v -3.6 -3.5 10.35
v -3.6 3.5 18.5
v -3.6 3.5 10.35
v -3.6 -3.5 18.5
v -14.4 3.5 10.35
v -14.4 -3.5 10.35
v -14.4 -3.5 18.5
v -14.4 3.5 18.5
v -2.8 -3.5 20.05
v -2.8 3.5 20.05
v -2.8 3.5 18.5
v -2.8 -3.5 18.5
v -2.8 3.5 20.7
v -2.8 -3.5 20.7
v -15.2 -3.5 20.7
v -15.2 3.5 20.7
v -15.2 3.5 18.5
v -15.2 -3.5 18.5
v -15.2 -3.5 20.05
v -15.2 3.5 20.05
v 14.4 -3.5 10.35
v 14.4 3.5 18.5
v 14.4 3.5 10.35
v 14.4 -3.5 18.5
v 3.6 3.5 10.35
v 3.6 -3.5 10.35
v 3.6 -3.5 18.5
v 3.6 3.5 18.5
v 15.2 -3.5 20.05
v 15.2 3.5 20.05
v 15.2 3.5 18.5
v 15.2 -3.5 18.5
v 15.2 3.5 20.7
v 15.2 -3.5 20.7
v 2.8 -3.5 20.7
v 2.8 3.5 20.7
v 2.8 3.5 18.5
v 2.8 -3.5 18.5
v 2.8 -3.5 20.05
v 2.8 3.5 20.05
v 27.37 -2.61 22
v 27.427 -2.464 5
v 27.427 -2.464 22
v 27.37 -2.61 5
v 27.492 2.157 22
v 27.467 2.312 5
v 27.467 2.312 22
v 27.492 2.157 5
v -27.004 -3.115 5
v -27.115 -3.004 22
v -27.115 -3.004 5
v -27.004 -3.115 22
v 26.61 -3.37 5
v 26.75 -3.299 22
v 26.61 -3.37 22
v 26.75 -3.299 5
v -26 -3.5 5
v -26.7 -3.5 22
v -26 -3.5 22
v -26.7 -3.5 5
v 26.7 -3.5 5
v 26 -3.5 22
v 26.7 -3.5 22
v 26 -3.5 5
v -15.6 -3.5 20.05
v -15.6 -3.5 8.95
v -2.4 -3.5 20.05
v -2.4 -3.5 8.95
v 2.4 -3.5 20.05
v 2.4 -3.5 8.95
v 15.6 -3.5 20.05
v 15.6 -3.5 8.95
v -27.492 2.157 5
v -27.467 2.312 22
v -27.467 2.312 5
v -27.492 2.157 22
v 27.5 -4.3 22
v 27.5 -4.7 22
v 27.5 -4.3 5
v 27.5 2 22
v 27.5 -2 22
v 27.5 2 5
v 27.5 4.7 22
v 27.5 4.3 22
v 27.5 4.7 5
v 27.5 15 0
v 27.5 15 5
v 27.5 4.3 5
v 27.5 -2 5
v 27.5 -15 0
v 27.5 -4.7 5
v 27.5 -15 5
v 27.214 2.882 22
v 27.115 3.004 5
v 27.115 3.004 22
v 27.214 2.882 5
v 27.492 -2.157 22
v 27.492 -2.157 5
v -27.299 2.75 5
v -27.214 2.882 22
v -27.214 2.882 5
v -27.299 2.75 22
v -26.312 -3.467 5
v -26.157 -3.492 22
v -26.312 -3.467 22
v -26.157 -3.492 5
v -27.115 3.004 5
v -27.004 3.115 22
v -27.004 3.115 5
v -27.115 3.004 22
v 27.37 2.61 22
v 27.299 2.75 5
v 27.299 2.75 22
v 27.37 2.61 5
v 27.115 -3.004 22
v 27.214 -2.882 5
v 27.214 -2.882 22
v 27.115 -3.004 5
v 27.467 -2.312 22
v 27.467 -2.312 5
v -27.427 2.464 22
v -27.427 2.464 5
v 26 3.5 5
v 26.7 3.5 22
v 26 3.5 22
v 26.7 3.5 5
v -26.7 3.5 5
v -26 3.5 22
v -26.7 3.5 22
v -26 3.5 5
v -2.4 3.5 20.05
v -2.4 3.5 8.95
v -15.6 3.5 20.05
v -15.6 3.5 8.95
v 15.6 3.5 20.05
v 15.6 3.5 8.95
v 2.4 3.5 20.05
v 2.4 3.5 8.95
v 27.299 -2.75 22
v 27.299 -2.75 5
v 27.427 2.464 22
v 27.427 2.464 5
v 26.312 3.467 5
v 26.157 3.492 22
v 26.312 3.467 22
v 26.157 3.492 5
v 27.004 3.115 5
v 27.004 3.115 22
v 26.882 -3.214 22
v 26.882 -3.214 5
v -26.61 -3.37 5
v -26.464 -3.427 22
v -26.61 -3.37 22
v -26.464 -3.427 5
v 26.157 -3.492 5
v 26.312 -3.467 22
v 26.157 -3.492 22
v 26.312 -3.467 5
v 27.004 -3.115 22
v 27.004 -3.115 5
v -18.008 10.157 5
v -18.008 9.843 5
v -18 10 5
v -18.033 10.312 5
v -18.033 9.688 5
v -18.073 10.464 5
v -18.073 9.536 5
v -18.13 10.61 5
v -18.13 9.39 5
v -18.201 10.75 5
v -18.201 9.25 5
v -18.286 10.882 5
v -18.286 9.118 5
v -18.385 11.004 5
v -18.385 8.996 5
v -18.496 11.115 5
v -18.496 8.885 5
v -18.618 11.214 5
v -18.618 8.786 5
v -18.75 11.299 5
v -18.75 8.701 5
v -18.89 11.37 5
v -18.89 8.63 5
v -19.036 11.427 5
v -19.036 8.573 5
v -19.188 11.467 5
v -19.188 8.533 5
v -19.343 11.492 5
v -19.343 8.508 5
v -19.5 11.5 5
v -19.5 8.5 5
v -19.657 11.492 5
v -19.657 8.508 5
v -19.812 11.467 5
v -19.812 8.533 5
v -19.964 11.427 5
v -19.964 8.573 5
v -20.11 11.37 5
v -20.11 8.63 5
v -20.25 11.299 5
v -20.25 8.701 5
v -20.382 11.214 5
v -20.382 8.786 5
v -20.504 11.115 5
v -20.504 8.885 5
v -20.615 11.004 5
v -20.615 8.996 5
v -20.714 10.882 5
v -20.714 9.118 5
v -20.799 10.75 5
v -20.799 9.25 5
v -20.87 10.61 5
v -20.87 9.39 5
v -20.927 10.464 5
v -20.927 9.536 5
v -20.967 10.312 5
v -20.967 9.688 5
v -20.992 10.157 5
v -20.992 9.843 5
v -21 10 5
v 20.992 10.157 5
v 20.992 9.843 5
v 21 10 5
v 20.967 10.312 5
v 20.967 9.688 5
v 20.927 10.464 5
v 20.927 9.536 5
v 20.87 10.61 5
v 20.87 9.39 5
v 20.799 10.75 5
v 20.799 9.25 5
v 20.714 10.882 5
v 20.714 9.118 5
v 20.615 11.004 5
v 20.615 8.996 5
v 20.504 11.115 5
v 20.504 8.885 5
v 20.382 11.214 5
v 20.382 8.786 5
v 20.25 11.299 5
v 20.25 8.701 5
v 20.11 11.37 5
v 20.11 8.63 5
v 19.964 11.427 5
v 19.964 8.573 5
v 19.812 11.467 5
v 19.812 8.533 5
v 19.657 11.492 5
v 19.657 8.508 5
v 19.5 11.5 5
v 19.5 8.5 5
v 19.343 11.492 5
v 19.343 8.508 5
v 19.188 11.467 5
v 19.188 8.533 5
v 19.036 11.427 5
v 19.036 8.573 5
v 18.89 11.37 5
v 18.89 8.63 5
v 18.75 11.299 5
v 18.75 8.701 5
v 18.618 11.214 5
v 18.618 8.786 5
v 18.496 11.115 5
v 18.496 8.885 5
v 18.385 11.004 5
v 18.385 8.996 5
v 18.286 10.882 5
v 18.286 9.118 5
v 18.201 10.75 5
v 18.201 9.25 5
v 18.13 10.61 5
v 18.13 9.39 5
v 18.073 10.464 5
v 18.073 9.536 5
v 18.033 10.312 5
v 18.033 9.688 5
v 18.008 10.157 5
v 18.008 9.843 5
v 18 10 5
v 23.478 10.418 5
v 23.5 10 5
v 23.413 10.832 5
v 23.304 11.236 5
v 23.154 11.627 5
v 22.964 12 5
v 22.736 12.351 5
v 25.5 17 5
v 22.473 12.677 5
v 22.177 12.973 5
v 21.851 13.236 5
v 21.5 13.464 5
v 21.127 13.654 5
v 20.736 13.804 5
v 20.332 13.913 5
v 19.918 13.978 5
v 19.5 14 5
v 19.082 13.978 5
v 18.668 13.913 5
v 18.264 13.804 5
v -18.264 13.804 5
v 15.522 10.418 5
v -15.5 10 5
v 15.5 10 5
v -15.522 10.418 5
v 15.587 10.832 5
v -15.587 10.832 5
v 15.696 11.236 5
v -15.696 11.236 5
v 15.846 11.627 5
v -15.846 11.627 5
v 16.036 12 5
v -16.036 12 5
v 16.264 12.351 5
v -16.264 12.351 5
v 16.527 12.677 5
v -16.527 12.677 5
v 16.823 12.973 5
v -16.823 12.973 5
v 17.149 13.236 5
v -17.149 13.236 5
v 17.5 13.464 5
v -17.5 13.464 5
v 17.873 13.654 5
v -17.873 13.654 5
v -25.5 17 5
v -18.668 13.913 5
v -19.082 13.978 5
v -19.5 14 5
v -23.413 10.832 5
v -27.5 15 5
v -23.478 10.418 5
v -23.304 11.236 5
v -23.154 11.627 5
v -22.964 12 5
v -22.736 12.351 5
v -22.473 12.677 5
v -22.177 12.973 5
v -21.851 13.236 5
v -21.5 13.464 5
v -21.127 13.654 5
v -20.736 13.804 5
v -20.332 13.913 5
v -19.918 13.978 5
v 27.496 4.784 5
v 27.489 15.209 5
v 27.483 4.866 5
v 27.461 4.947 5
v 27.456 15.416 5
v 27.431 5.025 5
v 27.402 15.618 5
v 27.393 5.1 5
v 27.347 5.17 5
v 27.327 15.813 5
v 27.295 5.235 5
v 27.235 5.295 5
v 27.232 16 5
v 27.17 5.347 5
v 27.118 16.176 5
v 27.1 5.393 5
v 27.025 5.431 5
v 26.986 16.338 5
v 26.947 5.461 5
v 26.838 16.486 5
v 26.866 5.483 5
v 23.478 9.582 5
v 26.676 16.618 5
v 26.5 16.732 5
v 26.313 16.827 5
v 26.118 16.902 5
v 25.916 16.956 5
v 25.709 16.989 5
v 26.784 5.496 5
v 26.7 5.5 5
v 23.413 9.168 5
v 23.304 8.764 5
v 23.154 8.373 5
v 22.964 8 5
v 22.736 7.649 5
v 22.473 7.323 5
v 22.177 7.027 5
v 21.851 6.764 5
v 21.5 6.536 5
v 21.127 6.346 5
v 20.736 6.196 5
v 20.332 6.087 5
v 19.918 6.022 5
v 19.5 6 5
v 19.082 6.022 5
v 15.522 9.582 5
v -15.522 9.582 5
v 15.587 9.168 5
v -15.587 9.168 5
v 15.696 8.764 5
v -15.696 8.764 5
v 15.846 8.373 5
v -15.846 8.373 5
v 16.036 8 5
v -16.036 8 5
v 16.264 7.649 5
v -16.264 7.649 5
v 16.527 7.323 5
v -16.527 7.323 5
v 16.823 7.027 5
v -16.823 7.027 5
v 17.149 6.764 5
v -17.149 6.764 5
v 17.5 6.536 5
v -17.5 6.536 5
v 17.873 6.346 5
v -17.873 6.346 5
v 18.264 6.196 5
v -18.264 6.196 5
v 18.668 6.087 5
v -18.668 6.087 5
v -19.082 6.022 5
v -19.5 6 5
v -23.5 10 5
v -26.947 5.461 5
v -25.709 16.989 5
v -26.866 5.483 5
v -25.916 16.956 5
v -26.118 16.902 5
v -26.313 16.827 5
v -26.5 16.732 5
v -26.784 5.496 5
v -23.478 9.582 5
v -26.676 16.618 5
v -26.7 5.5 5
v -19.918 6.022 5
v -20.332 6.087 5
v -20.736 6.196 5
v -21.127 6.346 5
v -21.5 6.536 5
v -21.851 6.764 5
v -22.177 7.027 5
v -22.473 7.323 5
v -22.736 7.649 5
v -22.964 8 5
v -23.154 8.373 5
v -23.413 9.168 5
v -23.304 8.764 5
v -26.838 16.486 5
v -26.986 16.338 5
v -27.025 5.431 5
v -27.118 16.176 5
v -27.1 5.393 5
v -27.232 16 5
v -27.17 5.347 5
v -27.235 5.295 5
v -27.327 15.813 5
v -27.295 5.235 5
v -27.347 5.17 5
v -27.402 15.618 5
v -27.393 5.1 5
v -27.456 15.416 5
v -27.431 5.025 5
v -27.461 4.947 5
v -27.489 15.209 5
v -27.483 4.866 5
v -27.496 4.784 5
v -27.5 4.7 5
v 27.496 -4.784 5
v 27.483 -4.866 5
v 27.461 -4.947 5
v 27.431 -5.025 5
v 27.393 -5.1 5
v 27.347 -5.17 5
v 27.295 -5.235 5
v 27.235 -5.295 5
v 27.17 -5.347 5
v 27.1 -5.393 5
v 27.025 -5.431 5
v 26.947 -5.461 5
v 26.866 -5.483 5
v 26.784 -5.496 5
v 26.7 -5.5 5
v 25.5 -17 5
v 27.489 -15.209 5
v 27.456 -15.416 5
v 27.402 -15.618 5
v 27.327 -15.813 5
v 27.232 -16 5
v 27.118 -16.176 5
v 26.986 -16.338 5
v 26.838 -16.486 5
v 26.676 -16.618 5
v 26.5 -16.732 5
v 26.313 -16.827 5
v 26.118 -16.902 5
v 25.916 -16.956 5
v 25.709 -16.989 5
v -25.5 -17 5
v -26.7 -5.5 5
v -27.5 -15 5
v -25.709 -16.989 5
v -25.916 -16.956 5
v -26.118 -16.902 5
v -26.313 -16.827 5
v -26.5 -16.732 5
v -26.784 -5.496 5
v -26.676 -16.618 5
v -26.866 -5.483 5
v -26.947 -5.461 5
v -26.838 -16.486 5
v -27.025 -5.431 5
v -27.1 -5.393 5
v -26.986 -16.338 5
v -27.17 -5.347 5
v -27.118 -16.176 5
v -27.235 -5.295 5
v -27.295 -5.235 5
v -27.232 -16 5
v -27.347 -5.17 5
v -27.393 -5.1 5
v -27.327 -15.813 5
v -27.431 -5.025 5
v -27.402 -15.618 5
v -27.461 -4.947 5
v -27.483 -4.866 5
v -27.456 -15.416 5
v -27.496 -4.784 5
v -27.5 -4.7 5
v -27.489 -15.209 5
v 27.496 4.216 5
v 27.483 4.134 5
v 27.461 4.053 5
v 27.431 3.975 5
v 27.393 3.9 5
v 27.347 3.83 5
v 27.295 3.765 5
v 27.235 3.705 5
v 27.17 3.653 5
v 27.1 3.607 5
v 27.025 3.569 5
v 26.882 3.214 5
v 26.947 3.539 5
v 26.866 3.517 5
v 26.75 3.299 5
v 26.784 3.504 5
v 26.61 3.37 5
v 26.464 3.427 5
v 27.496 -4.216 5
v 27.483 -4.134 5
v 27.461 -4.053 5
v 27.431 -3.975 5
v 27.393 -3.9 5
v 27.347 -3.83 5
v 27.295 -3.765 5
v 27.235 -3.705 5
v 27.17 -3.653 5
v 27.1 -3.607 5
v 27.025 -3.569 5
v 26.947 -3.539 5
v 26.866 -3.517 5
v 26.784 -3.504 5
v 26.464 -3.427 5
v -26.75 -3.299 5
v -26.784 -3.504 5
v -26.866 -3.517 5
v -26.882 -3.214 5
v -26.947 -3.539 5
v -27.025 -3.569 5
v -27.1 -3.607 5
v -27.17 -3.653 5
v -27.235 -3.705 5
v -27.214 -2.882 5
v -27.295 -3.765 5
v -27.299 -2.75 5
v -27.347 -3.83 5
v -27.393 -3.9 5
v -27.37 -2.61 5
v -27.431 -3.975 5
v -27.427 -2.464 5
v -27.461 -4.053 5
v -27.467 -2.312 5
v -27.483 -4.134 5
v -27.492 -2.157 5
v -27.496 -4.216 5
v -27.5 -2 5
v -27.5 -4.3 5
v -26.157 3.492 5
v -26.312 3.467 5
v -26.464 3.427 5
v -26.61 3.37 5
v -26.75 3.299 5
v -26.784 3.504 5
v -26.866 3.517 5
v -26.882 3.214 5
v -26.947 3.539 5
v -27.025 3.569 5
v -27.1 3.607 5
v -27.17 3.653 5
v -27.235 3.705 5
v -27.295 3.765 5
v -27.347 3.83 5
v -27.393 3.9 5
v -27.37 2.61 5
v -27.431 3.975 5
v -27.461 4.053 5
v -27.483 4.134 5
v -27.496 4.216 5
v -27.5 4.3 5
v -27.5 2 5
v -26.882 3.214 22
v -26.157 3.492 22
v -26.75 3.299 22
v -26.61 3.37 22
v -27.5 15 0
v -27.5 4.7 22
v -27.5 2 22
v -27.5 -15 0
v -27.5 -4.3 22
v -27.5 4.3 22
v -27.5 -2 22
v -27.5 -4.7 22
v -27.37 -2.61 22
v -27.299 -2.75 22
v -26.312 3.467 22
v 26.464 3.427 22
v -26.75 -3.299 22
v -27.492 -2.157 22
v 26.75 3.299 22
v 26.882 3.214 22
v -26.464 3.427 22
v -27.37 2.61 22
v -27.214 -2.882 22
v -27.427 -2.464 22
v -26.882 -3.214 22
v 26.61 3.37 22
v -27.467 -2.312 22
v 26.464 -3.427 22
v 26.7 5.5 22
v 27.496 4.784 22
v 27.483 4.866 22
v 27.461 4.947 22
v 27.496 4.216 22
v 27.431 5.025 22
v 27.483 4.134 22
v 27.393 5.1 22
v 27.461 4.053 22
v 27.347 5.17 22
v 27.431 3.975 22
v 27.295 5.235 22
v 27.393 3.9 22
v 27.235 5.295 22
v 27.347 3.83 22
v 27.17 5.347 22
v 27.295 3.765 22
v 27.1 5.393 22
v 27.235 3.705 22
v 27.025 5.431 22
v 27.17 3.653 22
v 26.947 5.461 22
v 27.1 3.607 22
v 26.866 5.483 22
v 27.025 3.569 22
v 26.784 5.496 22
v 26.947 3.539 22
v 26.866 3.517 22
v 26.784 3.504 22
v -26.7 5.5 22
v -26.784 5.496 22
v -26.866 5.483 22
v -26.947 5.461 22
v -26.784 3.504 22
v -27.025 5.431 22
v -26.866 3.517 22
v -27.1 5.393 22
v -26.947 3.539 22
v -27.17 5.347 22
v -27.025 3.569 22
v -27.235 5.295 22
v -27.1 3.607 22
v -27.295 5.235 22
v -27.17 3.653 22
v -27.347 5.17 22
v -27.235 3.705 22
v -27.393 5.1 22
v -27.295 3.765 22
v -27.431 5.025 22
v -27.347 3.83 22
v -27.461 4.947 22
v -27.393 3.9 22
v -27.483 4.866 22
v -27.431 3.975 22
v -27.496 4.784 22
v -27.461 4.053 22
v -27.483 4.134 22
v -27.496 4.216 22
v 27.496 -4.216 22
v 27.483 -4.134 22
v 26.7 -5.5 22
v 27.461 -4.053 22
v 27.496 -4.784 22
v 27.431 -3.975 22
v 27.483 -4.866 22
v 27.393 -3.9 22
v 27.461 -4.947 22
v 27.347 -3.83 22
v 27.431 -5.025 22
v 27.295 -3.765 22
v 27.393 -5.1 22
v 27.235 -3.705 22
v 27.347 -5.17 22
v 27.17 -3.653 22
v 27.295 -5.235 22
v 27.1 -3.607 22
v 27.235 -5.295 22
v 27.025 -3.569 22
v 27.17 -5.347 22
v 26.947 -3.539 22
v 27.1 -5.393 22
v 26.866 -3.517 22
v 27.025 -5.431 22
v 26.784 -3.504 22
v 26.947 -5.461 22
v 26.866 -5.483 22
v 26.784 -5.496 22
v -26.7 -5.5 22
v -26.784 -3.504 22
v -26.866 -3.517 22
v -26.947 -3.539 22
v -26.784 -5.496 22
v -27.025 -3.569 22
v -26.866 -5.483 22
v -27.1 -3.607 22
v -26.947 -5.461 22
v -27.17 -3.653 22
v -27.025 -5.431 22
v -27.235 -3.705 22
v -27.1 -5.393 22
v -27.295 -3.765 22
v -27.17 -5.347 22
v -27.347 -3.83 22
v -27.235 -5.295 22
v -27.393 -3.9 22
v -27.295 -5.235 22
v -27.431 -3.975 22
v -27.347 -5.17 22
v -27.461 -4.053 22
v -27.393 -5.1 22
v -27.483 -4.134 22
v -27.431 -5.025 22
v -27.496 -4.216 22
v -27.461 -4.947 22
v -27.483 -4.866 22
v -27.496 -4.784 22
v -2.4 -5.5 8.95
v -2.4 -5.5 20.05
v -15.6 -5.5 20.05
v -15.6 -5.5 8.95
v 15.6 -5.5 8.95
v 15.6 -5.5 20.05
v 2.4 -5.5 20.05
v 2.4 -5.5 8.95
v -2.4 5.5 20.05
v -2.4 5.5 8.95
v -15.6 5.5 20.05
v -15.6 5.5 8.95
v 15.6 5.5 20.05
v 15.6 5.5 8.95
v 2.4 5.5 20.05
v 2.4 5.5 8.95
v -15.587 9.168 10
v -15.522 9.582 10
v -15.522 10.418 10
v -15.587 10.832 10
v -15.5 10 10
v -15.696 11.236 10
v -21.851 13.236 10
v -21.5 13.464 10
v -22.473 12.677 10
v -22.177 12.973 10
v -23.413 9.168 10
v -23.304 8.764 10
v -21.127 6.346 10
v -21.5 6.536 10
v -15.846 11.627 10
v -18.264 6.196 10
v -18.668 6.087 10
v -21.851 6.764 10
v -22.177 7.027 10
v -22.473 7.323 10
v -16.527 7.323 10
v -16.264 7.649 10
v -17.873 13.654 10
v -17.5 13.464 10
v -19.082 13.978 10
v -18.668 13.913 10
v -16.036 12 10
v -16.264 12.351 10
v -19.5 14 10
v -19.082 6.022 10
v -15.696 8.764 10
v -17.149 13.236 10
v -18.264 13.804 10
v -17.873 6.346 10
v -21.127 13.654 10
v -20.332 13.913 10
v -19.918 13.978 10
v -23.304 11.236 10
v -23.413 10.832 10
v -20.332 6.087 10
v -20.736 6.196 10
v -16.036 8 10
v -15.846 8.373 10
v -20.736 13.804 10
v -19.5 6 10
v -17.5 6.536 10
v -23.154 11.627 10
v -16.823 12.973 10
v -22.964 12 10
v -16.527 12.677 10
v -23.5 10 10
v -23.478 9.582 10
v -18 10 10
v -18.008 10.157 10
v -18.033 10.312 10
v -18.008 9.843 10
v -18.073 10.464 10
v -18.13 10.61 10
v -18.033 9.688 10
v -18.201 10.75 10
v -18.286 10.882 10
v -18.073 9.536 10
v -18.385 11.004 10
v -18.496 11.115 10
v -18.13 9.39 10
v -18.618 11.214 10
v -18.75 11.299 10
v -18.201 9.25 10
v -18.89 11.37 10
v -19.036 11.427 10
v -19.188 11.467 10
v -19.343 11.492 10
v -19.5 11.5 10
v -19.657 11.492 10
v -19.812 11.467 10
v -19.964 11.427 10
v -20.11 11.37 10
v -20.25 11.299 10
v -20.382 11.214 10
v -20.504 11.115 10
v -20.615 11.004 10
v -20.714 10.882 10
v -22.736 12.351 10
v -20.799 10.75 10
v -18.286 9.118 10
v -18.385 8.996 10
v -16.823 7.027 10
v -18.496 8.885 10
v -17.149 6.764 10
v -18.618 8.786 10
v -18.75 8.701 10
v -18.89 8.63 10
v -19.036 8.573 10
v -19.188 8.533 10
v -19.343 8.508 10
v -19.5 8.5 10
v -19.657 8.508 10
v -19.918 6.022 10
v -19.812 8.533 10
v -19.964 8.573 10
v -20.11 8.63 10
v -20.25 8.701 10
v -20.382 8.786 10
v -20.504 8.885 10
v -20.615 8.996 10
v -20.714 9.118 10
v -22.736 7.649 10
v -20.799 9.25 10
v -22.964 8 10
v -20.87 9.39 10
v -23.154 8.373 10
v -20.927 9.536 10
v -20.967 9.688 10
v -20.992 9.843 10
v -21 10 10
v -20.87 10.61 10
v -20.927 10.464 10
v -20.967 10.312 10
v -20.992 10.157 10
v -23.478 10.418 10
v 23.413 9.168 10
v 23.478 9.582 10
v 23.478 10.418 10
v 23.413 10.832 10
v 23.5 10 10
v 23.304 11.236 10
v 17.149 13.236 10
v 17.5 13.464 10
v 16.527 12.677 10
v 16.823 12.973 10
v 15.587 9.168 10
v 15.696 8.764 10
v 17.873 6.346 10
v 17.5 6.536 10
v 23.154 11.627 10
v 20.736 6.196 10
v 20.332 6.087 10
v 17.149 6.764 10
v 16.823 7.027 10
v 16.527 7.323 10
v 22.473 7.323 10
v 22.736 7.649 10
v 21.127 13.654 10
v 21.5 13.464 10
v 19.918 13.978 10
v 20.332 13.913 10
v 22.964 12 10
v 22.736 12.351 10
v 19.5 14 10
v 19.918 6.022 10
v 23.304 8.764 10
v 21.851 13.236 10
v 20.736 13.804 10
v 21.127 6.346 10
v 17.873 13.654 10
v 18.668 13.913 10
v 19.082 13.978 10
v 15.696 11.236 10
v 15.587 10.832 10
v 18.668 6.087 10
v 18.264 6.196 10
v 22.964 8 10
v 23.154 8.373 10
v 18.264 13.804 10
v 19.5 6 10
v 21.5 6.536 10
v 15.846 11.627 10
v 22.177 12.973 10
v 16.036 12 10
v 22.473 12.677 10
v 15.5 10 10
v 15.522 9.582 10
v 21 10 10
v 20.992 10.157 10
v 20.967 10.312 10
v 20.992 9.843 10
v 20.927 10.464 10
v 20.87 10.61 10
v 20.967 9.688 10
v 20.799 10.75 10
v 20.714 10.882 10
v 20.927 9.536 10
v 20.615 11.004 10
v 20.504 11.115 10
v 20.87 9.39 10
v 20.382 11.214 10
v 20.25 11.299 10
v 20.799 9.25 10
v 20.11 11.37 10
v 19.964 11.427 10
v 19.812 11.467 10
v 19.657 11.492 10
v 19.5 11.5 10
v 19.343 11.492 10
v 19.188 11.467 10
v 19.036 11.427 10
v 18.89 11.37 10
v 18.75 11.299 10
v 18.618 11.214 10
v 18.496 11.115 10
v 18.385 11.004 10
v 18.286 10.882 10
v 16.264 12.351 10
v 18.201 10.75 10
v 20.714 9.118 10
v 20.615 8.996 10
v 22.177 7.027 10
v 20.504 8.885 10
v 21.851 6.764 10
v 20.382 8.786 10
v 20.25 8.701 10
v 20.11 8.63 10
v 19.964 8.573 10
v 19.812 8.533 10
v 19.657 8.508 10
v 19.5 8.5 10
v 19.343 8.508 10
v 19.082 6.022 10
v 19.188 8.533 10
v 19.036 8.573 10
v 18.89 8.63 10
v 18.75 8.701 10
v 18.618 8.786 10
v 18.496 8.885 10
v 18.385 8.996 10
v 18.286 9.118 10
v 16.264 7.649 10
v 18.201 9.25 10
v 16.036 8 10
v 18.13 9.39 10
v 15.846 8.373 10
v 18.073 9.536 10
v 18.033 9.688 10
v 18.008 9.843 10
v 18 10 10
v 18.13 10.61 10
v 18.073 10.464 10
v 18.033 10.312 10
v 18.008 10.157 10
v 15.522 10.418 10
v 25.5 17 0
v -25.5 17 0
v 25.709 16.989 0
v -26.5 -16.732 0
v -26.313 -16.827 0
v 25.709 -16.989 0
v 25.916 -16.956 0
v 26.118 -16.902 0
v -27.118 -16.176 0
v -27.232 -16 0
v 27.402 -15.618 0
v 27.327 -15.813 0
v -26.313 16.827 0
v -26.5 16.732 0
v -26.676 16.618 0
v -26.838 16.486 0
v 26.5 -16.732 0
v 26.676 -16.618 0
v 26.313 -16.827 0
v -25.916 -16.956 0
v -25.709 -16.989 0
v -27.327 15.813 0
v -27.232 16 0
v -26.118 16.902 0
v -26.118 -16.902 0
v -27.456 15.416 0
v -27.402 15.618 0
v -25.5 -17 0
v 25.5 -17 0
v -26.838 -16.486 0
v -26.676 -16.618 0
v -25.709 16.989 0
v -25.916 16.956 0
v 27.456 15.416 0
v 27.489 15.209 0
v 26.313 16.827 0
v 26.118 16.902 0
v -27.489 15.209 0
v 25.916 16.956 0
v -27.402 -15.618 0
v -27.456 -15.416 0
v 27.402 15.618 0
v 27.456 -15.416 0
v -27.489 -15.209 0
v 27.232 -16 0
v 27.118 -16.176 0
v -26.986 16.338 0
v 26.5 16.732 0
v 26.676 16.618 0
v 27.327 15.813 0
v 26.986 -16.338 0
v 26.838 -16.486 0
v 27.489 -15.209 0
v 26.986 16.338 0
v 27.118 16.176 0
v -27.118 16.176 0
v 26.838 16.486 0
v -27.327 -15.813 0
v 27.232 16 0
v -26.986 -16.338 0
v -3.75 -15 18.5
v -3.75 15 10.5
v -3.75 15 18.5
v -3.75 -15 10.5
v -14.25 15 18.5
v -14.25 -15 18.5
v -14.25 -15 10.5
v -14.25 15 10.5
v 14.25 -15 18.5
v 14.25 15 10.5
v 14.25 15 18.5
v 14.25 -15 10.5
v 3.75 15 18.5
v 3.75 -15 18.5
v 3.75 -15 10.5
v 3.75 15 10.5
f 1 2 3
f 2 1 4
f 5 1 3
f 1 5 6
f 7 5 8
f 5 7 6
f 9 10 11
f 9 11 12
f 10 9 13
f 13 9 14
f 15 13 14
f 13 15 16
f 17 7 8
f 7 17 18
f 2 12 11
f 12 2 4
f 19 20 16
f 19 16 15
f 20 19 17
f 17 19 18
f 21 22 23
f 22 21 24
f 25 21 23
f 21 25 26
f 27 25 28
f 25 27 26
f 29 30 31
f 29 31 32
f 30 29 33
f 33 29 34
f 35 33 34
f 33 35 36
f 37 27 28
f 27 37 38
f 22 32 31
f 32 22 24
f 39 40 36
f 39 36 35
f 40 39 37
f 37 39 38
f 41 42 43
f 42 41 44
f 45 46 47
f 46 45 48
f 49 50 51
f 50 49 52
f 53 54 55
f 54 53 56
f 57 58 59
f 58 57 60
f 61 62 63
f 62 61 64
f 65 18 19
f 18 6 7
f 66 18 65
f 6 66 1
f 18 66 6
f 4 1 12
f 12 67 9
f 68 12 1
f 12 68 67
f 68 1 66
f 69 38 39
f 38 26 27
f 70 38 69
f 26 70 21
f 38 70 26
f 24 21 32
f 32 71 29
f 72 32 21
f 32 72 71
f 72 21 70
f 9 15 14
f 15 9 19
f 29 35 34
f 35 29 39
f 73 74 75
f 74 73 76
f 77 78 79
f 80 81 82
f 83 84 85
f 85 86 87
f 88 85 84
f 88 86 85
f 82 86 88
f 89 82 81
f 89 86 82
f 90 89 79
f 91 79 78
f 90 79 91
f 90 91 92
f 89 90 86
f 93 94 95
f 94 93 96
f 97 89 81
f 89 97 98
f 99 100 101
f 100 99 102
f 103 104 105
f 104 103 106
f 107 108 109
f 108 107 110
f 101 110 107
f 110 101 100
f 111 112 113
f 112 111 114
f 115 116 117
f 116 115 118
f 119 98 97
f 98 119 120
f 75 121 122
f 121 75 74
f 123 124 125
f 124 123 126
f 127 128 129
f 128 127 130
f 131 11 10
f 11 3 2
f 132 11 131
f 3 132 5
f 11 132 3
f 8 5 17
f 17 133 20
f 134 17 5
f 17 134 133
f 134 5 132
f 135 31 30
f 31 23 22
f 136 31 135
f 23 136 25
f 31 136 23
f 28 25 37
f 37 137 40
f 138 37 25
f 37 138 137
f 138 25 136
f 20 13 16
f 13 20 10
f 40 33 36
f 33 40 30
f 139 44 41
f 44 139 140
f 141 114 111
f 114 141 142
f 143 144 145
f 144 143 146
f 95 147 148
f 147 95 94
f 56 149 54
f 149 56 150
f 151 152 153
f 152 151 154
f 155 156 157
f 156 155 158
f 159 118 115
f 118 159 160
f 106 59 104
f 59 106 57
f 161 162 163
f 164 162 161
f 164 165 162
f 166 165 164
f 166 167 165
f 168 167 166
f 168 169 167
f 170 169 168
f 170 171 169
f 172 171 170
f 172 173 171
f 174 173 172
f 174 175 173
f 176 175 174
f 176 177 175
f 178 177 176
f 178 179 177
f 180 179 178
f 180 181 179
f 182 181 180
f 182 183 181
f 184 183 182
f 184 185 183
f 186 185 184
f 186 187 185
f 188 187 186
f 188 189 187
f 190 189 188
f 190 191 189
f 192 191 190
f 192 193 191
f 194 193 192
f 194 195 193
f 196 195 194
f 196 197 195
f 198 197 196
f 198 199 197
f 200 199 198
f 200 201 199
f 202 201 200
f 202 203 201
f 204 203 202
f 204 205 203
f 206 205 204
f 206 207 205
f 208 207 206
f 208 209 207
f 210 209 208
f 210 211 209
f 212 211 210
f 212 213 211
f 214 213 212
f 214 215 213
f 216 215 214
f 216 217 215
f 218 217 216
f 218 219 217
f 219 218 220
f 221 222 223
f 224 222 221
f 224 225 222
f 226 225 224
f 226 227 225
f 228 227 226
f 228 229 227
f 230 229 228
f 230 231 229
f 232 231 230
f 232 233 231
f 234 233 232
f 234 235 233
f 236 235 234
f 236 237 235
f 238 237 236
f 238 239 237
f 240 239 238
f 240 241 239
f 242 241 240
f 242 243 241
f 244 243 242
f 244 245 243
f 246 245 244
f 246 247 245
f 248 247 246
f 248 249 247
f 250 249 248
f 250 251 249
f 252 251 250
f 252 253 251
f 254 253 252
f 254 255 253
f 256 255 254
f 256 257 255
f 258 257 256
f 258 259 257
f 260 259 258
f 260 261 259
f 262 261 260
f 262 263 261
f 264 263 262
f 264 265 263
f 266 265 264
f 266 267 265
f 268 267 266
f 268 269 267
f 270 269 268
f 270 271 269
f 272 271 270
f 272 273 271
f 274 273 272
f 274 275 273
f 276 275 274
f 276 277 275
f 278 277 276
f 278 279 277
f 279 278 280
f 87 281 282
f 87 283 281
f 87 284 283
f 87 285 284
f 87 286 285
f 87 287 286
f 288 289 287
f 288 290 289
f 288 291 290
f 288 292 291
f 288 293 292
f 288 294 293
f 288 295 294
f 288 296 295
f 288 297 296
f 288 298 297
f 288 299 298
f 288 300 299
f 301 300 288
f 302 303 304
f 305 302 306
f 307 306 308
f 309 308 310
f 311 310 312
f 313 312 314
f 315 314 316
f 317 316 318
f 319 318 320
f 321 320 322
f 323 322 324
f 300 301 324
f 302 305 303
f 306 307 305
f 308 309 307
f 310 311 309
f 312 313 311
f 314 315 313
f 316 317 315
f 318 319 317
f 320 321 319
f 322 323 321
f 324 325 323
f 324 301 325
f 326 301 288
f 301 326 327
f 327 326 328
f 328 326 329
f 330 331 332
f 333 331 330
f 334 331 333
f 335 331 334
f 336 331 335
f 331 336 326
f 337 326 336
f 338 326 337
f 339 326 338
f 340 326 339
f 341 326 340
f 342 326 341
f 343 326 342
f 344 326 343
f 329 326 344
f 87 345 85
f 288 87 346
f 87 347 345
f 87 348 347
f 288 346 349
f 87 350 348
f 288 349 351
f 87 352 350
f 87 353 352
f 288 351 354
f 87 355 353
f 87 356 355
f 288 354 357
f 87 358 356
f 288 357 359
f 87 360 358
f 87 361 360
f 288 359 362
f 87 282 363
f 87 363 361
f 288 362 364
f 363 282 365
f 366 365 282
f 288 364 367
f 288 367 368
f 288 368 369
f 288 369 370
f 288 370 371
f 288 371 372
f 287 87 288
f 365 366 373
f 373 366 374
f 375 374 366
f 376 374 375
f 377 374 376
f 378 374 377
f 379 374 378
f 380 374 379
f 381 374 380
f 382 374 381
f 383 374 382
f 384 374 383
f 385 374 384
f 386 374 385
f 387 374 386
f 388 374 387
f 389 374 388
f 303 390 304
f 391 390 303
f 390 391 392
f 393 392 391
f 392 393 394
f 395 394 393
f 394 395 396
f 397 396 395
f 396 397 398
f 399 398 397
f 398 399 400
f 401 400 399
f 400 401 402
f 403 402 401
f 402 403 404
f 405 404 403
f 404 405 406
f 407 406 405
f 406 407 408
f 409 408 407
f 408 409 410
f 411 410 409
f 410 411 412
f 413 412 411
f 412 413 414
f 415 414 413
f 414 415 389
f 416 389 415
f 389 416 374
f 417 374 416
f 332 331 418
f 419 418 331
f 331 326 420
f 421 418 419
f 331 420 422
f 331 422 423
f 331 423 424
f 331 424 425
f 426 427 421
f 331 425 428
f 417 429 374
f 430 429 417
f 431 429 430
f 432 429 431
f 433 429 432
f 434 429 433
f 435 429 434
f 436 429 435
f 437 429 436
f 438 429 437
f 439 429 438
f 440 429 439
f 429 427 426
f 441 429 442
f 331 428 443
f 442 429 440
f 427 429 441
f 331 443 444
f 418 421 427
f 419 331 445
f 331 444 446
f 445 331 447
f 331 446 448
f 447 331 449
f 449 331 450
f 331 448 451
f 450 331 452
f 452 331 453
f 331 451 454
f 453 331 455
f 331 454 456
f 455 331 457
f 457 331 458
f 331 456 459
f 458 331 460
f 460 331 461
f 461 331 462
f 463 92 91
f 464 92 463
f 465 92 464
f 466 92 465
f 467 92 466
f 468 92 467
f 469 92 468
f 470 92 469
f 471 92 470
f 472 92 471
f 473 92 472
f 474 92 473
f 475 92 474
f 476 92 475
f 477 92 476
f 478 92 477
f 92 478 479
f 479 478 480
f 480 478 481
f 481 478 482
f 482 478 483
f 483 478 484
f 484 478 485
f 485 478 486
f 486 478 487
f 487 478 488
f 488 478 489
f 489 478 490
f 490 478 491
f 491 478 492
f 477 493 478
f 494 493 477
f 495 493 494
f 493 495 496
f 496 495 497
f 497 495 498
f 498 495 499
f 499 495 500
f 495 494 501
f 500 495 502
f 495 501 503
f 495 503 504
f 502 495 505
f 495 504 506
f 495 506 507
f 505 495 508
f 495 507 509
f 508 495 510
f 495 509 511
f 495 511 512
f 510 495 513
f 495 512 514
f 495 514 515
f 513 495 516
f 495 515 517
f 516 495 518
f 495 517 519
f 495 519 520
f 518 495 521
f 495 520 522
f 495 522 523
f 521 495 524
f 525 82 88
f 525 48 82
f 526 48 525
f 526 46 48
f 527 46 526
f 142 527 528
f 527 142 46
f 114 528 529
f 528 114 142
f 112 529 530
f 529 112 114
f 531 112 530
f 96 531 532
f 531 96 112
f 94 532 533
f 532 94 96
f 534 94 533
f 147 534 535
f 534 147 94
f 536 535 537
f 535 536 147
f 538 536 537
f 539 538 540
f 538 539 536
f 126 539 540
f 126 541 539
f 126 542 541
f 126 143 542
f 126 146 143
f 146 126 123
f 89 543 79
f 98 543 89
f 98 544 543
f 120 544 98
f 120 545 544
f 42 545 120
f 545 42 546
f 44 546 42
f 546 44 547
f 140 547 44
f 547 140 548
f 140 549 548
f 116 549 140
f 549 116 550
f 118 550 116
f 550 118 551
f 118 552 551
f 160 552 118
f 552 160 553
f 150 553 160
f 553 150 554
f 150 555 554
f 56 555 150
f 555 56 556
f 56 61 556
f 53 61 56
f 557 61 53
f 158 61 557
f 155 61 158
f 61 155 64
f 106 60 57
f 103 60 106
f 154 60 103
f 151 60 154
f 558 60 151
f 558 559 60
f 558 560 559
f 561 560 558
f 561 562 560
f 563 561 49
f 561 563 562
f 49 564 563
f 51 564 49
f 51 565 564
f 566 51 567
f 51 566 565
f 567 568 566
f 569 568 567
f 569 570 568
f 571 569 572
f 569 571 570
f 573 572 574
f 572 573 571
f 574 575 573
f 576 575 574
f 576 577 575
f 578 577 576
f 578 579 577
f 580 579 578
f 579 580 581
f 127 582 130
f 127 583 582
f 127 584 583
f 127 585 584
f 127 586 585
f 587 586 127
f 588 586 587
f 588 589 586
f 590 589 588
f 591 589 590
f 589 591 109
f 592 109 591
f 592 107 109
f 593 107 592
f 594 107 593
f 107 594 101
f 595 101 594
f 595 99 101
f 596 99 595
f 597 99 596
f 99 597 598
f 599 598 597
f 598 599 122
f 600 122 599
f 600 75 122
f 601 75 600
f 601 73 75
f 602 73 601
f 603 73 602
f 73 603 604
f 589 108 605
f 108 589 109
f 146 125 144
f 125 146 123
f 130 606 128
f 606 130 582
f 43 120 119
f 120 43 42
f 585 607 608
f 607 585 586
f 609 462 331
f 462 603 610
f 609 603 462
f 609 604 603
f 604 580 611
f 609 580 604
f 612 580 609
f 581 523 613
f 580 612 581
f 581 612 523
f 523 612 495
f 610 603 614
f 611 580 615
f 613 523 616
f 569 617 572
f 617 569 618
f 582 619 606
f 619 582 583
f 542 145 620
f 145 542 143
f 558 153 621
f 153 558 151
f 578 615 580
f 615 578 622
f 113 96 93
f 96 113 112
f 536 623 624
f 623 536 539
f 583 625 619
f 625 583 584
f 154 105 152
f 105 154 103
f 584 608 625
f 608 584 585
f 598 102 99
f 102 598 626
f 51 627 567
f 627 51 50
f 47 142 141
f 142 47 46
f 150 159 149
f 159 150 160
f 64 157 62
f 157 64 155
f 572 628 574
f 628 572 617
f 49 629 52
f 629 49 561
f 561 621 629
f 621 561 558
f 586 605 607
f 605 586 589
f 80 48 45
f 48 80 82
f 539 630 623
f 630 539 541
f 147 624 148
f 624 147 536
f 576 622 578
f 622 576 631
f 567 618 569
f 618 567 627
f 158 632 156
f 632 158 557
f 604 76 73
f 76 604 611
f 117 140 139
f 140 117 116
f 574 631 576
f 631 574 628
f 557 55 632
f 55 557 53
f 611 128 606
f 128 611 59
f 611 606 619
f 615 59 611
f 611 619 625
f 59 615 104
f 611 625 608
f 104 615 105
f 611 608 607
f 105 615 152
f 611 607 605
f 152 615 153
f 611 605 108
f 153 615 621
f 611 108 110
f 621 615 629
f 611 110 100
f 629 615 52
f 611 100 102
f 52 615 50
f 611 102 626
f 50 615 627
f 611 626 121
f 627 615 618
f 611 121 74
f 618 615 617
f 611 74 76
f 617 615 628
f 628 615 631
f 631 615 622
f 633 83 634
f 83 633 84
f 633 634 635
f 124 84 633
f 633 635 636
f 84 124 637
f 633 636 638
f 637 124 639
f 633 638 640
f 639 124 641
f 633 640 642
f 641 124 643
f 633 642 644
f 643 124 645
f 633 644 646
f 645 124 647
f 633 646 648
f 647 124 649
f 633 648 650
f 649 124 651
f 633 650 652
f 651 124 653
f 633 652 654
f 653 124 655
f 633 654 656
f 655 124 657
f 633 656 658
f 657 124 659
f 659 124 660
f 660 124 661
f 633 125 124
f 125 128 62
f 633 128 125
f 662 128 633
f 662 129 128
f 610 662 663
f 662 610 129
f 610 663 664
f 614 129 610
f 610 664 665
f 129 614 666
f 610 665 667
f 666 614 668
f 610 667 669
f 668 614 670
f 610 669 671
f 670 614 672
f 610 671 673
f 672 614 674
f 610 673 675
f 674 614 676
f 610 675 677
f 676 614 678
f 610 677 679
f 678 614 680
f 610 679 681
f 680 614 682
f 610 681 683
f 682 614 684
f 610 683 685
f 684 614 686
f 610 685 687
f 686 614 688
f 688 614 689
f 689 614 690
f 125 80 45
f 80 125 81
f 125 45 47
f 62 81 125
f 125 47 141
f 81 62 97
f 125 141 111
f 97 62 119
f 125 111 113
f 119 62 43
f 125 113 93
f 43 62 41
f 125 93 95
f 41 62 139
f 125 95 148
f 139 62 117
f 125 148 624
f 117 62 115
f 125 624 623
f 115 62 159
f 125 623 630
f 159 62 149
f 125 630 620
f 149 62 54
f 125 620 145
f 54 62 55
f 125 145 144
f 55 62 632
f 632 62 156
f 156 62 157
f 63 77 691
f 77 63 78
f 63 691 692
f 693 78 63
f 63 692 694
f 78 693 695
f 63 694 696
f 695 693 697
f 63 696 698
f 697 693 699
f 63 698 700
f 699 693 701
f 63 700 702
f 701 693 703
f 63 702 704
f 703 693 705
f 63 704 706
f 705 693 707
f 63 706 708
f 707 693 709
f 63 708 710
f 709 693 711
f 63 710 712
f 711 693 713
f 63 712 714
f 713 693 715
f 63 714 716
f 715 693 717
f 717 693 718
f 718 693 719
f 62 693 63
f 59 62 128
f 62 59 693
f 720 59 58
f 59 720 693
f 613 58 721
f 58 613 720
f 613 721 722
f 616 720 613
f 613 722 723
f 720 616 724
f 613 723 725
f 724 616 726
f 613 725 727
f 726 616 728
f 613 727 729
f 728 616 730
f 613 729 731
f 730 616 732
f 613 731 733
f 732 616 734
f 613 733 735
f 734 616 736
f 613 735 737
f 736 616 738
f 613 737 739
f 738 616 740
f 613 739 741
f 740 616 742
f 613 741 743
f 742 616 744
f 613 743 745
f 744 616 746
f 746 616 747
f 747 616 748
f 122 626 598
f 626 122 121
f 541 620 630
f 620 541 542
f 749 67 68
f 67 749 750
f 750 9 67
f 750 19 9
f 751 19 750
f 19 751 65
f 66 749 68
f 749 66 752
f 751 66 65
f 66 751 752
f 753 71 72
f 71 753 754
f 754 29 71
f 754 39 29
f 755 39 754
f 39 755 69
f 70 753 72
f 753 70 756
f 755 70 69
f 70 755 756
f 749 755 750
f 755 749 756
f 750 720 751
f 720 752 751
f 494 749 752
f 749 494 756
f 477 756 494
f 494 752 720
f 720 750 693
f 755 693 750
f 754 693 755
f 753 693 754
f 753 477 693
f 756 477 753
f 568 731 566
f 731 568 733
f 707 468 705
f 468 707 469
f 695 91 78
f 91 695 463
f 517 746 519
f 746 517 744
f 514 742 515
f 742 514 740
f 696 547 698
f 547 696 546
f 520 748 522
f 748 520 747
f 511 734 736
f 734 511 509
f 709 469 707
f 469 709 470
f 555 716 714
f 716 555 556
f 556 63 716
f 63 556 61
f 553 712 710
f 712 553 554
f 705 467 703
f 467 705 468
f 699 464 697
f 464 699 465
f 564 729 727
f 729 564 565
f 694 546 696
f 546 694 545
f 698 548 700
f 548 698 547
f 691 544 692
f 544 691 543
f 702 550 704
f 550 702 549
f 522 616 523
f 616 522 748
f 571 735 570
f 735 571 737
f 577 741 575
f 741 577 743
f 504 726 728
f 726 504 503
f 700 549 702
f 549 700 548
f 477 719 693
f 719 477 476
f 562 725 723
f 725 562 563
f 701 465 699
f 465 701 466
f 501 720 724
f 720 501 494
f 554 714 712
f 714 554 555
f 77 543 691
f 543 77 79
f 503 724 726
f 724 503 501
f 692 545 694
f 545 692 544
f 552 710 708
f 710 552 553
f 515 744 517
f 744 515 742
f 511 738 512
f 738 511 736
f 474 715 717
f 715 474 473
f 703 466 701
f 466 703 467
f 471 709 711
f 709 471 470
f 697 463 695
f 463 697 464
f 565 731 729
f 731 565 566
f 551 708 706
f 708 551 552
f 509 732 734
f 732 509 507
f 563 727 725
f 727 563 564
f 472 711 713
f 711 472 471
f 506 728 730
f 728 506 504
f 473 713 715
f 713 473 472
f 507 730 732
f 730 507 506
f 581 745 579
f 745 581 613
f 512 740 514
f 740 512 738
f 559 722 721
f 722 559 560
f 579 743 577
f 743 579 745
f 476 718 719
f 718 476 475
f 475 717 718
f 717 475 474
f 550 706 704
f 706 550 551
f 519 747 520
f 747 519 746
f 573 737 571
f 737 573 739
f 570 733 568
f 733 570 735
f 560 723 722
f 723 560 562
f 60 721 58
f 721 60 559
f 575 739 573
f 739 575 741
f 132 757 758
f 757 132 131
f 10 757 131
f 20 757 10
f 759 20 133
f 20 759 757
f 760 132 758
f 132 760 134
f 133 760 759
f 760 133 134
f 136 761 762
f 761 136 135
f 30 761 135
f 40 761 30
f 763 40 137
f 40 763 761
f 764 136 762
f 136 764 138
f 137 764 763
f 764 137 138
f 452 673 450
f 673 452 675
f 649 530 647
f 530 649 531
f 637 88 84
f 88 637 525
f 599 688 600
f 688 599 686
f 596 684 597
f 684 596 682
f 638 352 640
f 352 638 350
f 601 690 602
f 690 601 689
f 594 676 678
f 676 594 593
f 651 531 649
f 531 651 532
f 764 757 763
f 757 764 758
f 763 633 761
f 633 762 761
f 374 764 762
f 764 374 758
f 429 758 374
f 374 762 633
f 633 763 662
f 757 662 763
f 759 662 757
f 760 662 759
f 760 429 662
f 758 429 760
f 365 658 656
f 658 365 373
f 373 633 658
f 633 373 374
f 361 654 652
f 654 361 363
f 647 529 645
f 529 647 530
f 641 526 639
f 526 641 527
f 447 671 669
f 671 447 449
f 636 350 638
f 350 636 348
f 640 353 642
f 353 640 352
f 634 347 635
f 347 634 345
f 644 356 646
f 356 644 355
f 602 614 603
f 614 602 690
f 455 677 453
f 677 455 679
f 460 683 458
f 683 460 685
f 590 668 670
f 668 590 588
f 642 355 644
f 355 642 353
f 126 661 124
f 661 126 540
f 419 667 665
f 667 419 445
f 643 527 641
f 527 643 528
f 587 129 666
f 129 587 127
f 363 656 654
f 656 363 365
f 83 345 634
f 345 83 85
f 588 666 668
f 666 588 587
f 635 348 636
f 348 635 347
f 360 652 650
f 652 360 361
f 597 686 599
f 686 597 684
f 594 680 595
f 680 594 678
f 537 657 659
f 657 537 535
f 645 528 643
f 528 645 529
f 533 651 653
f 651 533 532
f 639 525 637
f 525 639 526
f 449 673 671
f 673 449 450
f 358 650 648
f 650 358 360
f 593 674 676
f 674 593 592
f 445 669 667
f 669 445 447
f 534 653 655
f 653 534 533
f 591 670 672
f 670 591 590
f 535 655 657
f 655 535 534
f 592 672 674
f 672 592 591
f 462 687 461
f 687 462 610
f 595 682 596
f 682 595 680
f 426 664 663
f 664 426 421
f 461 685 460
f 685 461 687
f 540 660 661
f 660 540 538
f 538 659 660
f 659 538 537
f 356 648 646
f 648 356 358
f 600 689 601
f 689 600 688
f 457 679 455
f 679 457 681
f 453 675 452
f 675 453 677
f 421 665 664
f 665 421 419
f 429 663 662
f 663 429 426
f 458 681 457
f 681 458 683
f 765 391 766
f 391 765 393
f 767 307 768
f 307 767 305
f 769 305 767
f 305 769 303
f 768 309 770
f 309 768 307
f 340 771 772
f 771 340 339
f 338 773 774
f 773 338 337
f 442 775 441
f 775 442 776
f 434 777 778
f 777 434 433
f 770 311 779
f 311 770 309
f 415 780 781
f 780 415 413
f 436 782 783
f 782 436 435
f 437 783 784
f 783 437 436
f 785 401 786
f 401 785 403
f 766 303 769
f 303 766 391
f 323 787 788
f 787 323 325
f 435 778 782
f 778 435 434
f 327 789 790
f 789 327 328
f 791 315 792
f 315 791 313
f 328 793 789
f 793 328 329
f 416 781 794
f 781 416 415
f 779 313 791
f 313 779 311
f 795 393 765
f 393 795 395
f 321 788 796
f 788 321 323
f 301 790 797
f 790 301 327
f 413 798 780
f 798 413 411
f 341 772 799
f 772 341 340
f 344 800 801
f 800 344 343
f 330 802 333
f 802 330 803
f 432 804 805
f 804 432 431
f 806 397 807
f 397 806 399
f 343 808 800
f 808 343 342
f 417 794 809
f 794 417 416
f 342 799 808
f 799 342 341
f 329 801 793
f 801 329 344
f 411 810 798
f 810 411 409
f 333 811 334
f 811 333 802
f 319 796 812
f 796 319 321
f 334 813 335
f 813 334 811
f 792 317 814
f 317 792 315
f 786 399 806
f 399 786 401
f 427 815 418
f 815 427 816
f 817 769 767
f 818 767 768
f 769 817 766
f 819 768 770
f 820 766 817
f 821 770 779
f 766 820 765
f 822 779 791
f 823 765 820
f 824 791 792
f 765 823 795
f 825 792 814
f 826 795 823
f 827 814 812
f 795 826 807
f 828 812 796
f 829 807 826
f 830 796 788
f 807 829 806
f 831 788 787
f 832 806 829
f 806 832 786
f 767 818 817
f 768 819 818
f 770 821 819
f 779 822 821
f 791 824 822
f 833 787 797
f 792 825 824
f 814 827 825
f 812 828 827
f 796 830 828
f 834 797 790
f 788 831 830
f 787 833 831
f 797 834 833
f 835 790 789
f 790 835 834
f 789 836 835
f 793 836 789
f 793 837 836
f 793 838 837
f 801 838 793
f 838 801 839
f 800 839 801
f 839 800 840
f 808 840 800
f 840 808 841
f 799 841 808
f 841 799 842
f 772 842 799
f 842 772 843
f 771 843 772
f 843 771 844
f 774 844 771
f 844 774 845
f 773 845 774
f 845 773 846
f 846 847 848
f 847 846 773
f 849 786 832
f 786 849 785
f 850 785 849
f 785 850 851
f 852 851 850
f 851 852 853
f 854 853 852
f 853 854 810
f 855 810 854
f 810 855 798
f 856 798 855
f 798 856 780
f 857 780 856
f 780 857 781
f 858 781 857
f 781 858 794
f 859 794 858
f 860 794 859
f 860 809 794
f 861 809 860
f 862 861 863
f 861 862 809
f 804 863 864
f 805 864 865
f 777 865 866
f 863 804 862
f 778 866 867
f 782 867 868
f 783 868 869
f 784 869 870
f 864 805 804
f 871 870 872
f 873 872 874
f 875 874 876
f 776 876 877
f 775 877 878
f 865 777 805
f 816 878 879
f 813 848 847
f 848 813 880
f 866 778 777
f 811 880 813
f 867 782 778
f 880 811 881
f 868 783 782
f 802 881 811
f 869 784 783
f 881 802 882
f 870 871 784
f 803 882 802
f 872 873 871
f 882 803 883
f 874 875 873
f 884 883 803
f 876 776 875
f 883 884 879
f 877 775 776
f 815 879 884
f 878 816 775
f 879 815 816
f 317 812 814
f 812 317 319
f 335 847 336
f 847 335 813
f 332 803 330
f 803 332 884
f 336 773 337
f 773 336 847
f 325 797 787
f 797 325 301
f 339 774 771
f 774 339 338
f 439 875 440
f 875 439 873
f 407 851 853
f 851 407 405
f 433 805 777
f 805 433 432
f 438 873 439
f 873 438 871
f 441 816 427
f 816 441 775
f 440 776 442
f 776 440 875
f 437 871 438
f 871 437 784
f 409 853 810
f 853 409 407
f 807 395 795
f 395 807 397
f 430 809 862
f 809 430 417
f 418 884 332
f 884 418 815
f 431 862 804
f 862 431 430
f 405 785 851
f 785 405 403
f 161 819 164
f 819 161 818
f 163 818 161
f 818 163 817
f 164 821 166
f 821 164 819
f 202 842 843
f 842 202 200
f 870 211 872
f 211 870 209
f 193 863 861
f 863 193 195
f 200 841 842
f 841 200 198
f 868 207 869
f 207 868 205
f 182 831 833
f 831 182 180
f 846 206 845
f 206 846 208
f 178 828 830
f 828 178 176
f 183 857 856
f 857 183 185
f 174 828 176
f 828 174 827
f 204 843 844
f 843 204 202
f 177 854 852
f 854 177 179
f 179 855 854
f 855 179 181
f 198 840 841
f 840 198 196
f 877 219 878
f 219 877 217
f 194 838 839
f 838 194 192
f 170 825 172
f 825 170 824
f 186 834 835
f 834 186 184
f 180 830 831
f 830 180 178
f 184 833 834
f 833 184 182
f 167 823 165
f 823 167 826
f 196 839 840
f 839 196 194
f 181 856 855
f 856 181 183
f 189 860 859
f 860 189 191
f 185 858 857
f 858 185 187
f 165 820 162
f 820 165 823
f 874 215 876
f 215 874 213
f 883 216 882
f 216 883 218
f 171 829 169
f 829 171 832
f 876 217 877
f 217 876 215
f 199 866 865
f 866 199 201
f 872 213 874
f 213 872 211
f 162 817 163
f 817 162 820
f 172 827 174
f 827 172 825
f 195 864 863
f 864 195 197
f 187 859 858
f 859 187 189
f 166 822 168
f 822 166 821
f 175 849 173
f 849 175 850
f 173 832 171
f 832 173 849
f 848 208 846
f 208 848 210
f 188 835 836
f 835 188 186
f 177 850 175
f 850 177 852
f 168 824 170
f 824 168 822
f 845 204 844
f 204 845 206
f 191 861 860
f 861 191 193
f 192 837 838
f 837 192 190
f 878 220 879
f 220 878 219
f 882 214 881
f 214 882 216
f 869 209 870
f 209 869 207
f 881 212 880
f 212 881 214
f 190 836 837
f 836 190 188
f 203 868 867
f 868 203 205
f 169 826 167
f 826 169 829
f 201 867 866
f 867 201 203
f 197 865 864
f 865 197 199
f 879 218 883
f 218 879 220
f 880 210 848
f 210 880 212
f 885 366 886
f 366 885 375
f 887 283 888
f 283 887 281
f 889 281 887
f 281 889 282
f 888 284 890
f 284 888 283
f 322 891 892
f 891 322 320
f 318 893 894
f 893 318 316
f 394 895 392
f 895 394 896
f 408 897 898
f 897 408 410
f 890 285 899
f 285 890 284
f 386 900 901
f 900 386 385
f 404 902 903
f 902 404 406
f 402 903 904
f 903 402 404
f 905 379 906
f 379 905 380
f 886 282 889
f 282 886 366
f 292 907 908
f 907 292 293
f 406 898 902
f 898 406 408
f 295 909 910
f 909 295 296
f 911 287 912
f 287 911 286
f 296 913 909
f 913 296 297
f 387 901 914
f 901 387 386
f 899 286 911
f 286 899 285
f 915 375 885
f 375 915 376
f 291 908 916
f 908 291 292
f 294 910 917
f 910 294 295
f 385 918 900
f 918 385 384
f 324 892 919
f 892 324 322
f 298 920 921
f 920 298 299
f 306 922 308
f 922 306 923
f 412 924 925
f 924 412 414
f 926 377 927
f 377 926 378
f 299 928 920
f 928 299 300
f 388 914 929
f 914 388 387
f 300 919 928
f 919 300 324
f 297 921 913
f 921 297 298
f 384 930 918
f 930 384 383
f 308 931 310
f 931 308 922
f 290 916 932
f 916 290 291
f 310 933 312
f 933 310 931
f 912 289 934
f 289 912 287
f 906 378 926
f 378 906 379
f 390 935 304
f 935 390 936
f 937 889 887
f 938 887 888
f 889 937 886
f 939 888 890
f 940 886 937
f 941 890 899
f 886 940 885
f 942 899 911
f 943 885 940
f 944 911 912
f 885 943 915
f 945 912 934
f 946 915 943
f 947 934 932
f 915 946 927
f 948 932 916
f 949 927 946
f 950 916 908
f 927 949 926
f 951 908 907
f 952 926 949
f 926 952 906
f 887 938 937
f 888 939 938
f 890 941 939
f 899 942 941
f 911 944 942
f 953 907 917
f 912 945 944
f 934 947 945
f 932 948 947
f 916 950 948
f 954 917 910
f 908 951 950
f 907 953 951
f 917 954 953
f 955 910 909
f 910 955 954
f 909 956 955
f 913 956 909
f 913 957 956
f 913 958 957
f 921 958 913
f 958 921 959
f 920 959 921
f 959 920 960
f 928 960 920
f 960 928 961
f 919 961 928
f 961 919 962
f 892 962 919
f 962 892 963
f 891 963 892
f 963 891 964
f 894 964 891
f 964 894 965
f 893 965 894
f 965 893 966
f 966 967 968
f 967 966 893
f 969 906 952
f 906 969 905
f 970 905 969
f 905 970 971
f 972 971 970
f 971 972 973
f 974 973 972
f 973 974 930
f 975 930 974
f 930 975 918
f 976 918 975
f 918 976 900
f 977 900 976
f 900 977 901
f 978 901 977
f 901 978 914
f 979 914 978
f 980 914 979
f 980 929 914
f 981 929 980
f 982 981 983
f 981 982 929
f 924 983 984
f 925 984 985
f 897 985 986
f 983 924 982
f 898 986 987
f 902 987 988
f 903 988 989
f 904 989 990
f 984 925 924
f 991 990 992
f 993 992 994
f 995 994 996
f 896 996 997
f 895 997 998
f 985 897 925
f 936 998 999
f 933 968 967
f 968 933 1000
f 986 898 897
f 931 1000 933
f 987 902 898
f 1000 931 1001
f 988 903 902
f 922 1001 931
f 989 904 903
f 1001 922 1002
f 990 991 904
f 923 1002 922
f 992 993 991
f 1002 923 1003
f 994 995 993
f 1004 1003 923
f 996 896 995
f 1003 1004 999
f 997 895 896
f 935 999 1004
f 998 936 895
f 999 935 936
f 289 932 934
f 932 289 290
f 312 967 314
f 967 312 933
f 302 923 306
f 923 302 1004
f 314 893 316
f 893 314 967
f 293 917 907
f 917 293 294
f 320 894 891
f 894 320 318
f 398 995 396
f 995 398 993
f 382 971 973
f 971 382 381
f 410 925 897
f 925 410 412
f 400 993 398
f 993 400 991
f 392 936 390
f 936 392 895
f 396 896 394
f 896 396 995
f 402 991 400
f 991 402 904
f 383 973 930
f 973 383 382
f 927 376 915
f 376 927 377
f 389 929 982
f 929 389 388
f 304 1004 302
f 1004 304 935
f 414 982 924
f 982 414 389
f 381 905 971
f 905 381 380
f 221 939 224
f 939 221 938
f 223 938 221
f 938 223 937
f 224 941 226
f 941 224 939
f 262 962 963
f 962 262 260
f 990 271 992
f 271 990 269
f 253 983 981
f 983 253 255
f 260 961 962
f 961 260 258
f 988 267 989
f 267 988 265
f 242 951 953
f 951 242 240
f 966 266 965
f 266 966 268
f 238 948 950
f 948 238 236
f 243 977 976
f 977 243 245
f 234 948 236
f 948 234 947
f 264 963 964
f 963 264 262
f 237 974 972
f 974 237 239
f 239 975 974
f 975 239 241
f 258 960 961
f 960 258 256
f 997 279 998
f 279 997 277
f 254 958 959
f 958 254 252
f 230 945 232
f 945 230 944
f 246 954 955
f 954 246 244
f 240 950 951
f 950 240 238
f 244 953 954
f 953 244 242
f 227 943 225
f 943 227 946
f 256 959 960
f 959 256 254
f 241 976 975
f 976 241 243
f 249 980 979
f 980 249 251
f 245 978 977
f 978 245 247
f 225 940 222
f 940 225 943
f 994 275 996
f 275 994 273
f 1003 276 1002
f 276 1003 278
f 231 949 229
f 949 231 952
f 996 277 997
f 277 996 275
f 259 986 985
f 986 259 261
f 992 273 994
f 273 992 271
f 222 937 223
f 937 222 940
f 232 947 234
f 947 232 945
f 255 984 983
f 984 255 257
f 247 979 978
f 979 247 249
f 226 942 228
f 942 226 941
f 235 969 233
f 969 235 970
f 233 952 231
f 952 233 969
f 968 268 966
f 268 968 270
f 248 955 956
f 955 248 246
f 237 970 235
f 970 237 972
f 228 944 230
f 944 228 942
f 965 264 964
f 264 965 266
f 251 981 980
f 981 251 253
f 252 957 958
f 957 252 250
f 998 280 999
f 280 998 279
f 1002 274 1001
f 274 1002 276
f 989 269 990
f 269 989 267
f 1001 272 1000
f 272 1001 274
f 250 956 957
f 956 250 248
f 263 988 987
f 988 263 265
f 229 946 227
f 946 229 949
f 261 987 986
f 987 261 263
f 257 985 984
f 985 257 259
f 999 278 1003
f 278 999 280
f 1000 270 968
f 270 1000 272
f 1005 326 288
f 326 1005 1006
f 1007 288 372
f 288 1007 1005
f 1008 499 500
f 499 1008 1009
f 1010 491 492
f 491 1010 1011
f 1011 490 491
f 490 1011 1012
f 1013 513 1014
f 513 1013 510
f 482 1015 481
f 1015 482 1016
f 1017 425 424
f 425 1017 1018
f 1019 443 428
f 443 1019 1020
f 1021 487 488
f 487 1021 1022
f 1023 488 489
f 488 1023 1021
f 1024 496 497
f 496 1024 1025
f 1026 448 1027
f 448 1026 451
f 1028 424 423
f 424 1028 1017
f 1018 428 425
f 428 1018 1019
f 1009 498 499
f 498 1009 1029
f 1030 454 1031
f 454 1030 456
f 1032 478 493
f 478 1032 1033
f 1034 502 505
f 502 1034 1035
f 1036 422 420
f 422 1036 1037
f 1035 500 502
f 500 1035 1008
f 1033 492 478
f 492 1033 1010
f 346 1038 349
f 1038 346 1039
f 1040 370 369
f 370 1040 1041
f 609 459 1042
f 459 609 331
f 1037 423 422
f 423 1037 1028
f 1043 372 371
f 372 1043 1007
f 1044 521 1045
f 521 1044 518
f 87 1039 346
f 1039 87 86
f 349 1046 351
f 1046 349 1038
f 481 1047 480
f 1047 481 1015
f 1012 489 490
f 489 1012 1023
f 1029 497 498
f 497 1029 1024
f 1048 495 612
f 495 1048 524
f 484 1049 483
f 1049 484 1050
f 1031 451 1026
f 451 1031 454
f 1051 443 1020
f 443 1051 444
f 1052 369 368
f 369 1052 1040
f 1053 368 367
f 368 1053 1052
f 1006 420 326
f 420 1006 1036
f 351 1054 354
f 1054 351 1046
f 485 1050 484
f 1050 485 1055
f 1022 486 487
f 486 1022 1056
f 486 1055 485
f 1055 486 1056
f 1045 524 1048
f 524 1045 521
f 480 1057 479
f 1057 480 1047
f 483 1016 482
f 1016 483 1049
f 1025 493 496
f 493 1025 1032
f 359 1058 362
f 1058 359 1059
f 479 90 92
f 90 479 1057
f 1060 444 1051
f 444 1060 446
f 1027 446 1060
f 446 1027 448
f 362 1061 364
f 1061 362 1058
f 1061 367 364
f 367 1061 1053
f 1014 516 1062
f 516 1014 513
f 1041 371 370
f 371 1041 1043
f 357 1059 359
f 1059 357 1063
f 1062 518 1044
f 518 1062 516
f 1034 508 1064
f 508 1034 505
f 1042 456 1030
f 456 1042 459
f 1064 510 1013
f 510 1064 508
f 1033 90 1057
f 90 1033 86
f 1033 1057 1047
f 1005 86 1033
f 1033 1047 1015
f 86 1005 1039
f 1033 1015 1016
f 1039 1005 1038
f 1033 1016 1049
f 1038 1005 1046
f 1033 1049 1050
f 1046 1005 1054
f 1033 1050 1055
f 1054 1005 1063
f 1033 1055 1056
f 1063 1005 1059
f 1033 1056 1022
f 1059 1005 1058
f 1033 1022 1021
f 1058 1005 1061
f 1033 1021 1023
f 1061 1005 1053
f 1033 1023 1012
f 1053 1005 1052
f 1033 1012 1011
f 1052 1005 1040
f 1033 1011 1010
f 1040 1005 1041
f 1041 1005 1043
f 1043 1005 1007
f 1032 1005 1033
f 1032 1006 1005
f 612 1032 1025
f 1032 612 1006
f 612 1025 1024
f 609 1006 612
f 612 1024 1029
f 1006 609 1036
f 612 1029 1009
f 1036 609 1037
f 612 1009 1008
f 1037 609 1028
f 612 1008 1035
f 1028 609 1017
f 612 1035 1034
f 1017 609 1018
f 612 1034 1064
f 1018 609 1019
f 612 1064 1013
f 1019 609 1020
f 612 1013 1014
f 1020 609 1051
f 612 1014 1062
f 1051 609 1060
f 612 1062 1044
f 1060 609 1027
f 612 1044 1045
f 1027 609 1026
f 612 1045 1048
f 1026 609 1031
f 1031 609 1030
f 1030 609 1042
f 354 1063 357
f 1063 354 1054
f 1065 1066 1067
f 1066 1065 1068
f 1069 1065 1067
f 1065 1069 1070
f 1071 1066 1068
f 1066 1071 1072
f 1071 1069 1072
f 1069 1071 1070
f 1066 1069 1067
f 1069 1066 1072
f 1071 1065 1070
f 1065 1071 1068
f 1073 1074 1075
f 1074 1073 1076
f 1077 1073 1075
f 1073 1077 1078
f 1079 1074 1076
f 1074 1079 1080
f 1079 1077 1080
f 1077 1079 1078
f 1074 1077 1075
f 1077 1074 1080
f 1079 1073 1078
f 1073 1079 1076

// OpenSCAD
/*
Standalone SC Connector Holder Test Piece
- Prints only the internal SC connector holder/rack.
- No enclosure, no cable holes, no lid.
- Two simplex SC coupler openings face front/back through the vertical rack.
- Adjust SC_Cutout_* values if your couplers fit too tight or too loose.
*/

$fn = 60;

/* [SC connector holder test settings] */
SC_Count                 = 2;
SC_Holder_Spacing        = 18;     // center-to-center spacing between SC couplers
SC_Cutout_Width          = 10.5;   // SC coupler body width, side-to-side
SC_Cutout_Height         = 8.0;    // SC coupler body height through bracket
SC_Cutout_Length         = 30.0;   // visual/test clearance length front-to-back
SC_Holder_Base_Height    = 5.0;    // raised base height
SC_Holder_Block_Height   = 17.0;   // vertical bracket height above base
SC_Holder_Block_Thickness= 7.0;    // front/back thickness of retaining bracket
SC_Holder_ScrewDiameter  = 3.0;    // optional base screw holes
SC_Clearance             = 0.30;   // extra clearance added to cutout width/height
Show_Test_Coupler_Ghosts = true;   // translucent reference blocks, not for export

// Derived values
holder_length = max(55, (SC_Count-1)*SC_Holder_Spacing + SC_Cutout_Width + 24);
base_width    = 34;
base_height   = SC_Holder_Base_Height;
block_height  = SC_Holder_Block_Height;
block_thick   = SC_Holder_Block_Thickness;
cut_z         = base_height + 9.5;

SCInternalElevatedHolder();

if (Show_Test_Coupler_Ghosts) {
    color([0,0,1,0.25])
    for (i=[0:SC_Count-1]) {
        x = (i - (SC_Count-1)/2) * SC_Holder_Spacing;
        translate([x, 0, cut_z])
            cube([SC_Cutout_Width, SC_Cutout_Length, SC_Cutout_Height], center=true);
    }
}

module SCInternalElevatedHolder(){
    union(){
        // Raised base platform.
        translate([0,0,base_height/2])
            roundedBox([holder_length, base_width, base_height], 2, true);

        // Vertical retaining bracket. SC adapters pass through front/back along Y.
        translate([0,0,base_height + block_height/2])
            difference(){
                roundedBox([holder_length, block_thick, block_height], 1.5, true);

                for (i=[0:SC_Count-1]) {
                    x = (i - (SC_Count-1)/2) * SC_Holder_Spacing;

                    // Main SC adapter body pass-through.
                    translate([x,0,cut_z - (base_height + block_height/2)])
                        cube([SC_Cutout_Width + SC_Clearance,
                              block_thick + 1.4,
                              SC_Cutout_Height + SC_Clearance], center=true);

                    // Top latch relief for common SC simplex couplers.
                    translate([x,0,cut_z - (base_height + block_height/2) + SC_Cutout_Height/2 + 1.1])
                        cube([SC_Cutout_Width + 1.6 + SC_Clearance,
                              block_thick + 1.6,
                              2.2], center=true);
                }
            }

        // Keeper lips on both faces to reduce rocking.
        for (y=[-block_thick/2-1.0, block_thick/2+1.0]){
            translate([0,y,base_height + block_height/2])
                difference(){
                    roundedBox([holder_length, 2.0, block_height], 0.8, true);
                    for (i=[0:SC_Count-1]) {
                        x = (i - (SC_Count-1)/2) * SC_Holder_Spacing;
                        translate([x,0,cut_z - (base_height + block_height/2)])
                            cube([SC_Cutout_Width + 2.4 + SC_Clearance,
                                  2.6,
                                  SC_Cutout_Height + 2.8 + SC_Clearance], center=true);
                    }
                }
        }

        // Optional screw pads in the base for future clamp bar testing.
        for (x=[-holder_length/2+8, holder_length/2-8]){
            translate([x, base_width/2-7, base_height])
                difference(){
                    cylinder(h=5, d=8, center=false);
                    translate([0,0,-0.1])
                        cylinder(h=5.3, d=SC_Holder_ScrewDiameter, center=false);
                }
        }
    }
}

module roundedBox(size=[10,10,10], radius=1, center=true) {
    // Simple rounded rectangular solid using hull of corner cylinders.
    x = size[0];
    y = size[1];
    z = size[2];
    translate(center ? [0,0,0] : [x/2,y/2,z/2])
        hull() {
            for (ix=[-1,1], iy=[-1,1])
                translate([ix*(x/2-radius), iy*(y/2-radius), 0])
                    cylinder(h=z, r=radius, center=true);
        }
}
